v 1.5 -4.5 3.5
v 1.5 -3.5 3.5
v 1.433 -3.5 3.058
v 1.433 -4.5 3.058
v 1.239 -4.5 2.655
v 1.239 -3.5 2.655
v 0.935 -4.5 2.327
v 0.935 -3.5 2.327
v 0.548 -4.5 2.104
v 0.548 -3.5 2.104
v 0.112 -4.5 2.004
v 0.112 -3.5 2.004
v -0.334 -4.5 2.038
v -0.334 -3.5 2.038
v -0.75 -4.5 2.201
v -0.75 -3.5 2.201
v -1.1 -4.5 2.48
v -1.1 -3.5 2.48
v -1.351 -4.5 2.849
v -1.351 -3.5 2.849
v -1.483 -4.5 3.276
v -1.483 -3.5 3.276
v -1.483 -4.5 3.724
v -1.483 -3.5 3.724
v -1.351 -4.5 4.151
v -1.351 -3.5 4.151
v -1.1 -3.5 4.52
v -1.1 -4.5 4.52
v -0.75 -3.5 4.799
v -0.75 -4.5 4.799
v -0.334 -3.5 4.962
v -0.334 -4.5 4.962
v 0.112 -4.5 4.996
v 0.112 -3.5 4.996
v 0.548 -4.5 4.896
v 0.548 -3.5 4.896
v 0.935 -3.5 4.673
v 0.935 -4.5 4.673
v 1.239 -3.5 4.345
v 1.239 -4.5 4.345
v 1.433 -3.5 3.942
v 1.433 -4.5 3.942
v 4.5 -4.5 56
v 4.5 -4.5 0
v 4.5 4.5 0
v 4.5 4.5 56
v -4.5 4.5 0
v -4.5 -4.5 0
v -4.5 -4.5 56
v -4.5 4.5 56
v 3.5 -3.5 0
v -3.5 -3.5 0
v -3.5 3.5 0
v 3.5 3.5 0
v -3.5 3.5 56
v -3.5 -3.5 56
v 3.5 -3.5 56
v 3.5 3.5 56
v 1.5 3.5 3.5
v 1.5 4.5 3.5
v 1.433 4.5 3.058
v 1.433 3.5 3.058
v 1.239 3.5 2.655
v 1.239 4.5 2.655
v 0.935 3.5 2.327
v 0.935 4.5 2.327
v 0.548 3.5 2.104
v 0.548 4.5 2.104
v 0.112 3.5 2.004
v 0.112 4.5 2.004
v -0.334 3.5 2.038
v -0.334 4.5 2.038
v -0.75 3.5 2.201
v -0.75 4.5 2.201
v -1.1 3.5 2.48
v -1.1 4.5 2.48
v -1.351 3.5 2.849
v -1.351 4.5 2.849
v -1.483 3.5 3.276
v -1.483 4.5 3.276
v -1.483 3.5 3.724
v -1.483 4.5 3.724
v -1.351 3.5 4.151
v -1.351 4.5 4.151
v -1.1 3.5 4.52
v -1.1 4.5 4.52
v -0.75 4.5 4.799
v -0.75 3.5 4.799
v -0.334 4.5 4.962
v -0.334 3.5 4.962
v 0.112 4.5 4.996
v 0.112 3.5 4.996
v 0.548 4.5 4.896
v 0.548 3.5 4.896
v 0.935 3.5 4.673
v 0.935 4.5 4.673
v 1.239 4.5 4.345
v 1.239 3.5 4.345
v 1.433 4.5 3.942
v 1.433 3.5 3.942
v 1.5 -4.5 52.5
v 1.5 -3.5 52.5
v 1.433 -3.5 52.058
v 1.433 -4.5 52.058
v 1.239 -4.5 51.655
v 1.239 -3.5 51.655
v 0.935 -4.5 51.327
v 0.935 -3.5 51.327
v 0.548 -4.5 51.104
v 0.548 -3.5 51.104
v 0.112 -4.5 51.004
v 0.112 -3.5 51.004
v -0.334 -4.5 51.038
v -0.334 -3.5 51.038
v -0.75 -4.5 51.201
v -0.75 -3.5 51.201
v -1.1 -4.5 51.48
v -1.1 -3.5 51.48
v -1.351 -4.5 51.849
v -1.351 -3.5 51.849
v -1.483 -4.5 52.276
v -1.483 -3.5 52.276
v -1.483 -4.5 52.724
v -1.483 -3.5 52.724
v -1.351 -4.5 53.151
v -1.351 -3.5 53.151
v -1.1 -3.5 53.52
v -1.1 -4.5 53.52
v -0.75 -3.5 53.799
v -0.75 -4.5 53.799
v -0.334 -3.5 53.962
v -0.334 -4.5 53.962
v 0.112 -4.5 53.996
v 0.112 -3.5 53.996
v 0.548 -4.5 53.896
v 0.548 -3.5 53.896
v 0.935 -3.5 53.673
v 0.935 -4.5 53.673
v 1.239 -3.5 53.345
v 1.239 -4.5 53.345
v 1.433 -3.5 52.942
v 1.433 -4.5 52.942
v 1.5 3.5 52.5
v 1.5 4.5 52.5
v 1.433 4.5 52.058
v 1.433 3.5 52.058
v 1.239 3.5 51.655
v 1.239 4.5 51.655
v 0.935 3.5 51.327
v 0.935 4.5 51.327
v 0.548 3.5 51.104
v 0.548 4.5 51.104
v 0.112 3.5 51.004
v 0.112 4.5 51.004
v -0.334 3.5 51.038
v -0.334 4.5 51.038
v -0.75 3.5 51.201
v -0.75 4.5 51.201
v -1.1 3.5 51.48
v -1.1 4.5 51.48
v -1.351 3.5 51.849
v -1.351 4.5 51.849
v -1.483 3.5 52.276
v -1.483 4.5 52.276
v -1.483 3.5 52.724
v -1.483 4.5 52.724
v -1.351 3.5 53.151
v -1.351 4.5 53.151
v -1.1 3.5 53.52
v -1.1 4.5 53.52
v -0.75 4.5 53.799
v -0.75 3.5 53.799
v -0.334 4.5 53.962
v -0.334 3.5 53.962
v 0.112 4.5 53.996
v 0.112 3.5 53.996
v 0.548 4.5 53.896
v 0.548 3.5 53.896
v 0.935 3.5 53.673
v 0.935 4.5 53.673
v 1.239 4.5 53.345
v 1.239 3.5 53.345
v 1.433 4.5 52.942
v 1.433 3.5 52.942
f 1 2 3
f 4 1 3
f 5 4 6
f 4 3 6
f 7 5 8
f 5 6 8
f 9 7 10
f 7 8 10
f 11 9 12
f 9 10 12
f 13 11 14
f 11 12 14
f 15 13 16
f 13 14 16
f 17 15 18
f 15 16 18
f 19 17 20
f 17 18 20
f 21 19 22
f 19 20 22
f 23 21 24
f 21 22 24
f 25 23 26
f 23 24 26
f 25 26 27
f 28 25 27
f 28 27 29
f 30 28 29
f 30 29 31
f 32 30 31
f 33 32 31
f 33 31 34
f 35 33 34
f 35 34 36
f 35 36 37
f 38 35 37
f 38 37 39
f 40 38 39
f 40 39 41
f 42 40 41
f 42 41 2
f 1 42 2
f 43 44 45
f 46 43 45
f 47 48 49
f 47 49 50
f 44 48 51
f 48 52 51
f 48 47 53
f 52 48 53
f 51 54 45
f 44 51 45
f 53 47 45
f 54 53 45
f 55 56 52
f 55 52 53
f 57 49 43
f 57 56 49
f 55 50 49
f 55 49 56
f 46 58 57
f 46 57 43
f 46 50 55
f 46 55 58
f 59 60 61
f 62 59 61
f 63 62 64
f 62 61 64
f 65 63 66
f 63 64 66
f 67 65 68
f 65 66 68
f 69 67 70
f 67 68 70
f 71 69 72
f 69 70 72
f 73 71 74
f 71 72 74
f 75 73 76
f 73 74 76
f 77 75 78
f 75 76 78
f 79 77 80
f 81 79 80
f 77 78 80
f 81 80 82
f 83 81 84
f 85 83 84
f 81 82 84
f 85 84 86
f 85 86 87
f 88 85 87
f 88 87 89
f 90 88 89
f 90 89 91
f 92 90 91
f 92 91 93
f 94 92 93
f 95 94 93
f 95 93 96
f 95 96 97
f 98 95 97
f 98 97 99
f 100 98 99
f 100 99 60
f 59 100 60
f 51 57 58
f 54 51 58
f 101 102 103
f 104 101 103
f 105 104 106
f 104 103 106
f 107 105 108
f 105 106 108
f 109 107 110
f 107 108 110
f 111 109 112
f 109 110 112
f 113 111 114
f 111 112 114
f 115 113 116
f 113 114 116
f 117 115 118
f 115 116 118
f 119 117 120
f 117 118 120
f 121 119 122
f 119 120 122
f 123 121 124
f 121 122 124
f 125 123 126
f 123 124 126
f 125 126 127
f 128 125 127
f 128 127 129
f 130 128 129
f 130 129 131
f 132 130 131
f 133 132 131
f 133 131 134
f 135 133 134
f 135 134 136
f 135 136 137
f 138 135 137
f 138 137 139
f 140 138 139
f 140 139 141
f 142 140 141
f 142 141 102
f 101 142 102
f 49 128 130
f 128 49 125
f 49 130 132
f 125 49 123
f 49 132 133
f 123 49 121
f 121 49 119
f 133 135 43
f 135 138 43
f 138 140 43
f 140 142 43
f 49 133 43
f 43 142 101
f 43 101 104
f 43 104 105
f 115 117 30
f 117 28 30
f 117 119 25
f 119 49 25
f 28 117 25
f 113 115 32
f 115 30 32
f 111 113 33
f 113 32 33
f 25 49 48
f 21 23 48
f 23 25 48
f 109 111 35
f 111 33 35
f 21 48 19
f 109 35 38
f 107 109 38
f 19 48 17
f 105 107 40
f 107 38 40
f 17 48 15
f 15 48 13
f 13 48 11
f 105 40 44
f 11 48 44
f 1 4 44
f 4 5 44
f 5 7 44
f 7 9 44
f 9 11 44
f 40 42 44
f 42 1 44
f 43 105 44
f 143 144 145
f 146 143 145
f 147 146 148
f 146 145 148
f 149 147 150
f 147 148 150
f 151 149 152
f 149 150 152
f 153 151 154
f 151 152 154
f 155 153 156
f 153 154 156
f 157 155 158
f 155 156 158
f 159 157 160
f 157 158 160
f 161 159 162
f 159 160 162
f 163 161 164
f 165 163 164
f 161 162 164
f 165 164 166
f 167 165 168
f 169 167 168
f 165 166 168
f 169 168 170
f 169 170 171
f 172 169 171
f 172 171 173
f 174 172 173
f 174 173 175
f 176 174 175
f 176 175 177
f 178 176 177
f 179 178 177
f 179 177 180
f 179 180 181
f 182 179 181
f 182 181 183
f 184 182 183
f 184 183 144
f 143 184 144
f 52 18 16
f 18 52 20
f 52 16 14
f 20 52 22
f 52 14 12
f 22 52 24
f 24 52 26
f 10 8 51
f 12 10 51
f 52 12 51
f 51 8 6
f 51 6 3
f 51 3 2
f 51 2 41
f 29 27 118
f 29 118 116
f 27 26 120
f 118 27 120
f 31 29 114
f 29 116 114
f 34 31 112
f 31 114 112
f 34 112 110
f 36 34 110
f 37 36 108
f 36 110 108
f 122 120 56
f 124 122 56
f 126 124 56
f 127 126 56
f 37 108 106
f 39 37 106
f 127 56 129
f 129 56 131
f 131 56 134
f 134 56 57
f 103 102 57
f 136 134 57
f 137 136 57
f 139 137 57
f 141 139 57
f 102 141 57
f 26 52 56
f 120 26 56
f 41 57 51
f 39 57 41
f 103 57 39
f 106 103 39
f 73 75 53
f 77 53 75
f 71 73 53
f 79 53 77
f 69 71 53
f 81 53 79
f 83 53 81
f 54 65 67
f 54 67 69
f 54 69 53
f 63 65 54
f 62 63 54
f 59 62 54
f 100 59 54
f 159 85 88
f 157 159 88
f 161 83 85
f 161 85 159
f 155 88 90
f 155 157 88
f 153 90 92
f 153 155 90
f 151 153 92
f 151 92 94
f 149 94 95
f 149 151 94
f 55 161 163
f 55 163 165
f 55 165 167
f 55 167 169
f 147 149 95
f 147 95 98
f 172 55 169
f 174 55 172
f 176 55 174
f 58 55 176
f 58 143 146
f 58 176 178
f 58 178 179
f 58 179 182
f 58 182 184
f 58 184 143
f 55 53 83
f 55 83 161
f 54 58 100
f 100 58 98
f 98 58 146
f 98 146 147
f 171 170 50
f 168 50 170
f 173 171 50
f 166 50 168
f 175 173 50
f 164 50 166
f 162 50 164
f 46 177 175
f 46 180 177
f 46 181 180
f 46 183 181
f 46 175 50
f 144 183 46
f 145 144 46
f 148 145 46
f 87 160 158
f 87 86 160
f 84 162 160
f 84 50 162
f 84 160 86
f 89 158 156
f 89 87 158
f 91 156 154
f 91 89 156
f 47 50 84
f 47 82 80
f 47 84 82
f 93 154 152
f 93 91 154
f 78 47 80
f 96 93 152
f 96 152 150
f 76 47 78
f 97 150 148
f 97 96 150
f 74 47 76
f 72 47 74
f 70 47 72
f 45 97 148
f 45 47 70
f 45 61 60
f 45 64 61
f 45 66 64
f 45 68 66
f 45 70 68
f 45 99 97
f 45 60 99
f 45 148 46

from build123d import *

# Parameters (mm, degrees)
SKETCH_1_W          = 9
SKETCH_1_H          = 9
EXTRUDE_1_DEPTH     = 56
SKETCH_2_W          = 7
SKETCH_2_H          = 7
CUT_EXTRUDE_1_DEPTH = 56
SKETCH_3_R          = 1.5
CUT_EXTRUDE_2_DEPTH = 56


with BuildPart() as part:
    # ｽｹｯﾁ1 → ﾎﾞｽ - 押し出し1 (new body)
    with BuildSketch(Plane.XY):
        Rectangle(SKETCH_1_W, SKETCH_1_H)
    extrude(amount=EXTRUDE_1_DEPTH)

    # ｽｹｯﾁ2 → ｶｯﾄ - 押し出し1 (cut)
    with BuildSketch(Plane.XY.offset(56)):
        Rectangle(SKETCH_2_W, SKETCH_2_H)
    extrude(amount=-CUT_EXTRUDE_1_DEPTH, mode=Mode.SUBTRACT)

    # ｽｹｯﾁ3 → ｶｯﾄ - 押し出し2 (cut)
    with BuildSketch(Plane(origin=(0, 4.5, 0), x_dir=(1, 0, 0), z_dir=(0, 1, 0))):
        with Locations((0, -3.5)):
            Circle(SKETCH_3_R)
        with Locations((0, -52.5)):
            Circle(SKETCH_3_R)
    extrude(amount=-CUT_EXTRUDE_2_DEPTH, mode=Mode.SUBTRACT)


solid = part.part
